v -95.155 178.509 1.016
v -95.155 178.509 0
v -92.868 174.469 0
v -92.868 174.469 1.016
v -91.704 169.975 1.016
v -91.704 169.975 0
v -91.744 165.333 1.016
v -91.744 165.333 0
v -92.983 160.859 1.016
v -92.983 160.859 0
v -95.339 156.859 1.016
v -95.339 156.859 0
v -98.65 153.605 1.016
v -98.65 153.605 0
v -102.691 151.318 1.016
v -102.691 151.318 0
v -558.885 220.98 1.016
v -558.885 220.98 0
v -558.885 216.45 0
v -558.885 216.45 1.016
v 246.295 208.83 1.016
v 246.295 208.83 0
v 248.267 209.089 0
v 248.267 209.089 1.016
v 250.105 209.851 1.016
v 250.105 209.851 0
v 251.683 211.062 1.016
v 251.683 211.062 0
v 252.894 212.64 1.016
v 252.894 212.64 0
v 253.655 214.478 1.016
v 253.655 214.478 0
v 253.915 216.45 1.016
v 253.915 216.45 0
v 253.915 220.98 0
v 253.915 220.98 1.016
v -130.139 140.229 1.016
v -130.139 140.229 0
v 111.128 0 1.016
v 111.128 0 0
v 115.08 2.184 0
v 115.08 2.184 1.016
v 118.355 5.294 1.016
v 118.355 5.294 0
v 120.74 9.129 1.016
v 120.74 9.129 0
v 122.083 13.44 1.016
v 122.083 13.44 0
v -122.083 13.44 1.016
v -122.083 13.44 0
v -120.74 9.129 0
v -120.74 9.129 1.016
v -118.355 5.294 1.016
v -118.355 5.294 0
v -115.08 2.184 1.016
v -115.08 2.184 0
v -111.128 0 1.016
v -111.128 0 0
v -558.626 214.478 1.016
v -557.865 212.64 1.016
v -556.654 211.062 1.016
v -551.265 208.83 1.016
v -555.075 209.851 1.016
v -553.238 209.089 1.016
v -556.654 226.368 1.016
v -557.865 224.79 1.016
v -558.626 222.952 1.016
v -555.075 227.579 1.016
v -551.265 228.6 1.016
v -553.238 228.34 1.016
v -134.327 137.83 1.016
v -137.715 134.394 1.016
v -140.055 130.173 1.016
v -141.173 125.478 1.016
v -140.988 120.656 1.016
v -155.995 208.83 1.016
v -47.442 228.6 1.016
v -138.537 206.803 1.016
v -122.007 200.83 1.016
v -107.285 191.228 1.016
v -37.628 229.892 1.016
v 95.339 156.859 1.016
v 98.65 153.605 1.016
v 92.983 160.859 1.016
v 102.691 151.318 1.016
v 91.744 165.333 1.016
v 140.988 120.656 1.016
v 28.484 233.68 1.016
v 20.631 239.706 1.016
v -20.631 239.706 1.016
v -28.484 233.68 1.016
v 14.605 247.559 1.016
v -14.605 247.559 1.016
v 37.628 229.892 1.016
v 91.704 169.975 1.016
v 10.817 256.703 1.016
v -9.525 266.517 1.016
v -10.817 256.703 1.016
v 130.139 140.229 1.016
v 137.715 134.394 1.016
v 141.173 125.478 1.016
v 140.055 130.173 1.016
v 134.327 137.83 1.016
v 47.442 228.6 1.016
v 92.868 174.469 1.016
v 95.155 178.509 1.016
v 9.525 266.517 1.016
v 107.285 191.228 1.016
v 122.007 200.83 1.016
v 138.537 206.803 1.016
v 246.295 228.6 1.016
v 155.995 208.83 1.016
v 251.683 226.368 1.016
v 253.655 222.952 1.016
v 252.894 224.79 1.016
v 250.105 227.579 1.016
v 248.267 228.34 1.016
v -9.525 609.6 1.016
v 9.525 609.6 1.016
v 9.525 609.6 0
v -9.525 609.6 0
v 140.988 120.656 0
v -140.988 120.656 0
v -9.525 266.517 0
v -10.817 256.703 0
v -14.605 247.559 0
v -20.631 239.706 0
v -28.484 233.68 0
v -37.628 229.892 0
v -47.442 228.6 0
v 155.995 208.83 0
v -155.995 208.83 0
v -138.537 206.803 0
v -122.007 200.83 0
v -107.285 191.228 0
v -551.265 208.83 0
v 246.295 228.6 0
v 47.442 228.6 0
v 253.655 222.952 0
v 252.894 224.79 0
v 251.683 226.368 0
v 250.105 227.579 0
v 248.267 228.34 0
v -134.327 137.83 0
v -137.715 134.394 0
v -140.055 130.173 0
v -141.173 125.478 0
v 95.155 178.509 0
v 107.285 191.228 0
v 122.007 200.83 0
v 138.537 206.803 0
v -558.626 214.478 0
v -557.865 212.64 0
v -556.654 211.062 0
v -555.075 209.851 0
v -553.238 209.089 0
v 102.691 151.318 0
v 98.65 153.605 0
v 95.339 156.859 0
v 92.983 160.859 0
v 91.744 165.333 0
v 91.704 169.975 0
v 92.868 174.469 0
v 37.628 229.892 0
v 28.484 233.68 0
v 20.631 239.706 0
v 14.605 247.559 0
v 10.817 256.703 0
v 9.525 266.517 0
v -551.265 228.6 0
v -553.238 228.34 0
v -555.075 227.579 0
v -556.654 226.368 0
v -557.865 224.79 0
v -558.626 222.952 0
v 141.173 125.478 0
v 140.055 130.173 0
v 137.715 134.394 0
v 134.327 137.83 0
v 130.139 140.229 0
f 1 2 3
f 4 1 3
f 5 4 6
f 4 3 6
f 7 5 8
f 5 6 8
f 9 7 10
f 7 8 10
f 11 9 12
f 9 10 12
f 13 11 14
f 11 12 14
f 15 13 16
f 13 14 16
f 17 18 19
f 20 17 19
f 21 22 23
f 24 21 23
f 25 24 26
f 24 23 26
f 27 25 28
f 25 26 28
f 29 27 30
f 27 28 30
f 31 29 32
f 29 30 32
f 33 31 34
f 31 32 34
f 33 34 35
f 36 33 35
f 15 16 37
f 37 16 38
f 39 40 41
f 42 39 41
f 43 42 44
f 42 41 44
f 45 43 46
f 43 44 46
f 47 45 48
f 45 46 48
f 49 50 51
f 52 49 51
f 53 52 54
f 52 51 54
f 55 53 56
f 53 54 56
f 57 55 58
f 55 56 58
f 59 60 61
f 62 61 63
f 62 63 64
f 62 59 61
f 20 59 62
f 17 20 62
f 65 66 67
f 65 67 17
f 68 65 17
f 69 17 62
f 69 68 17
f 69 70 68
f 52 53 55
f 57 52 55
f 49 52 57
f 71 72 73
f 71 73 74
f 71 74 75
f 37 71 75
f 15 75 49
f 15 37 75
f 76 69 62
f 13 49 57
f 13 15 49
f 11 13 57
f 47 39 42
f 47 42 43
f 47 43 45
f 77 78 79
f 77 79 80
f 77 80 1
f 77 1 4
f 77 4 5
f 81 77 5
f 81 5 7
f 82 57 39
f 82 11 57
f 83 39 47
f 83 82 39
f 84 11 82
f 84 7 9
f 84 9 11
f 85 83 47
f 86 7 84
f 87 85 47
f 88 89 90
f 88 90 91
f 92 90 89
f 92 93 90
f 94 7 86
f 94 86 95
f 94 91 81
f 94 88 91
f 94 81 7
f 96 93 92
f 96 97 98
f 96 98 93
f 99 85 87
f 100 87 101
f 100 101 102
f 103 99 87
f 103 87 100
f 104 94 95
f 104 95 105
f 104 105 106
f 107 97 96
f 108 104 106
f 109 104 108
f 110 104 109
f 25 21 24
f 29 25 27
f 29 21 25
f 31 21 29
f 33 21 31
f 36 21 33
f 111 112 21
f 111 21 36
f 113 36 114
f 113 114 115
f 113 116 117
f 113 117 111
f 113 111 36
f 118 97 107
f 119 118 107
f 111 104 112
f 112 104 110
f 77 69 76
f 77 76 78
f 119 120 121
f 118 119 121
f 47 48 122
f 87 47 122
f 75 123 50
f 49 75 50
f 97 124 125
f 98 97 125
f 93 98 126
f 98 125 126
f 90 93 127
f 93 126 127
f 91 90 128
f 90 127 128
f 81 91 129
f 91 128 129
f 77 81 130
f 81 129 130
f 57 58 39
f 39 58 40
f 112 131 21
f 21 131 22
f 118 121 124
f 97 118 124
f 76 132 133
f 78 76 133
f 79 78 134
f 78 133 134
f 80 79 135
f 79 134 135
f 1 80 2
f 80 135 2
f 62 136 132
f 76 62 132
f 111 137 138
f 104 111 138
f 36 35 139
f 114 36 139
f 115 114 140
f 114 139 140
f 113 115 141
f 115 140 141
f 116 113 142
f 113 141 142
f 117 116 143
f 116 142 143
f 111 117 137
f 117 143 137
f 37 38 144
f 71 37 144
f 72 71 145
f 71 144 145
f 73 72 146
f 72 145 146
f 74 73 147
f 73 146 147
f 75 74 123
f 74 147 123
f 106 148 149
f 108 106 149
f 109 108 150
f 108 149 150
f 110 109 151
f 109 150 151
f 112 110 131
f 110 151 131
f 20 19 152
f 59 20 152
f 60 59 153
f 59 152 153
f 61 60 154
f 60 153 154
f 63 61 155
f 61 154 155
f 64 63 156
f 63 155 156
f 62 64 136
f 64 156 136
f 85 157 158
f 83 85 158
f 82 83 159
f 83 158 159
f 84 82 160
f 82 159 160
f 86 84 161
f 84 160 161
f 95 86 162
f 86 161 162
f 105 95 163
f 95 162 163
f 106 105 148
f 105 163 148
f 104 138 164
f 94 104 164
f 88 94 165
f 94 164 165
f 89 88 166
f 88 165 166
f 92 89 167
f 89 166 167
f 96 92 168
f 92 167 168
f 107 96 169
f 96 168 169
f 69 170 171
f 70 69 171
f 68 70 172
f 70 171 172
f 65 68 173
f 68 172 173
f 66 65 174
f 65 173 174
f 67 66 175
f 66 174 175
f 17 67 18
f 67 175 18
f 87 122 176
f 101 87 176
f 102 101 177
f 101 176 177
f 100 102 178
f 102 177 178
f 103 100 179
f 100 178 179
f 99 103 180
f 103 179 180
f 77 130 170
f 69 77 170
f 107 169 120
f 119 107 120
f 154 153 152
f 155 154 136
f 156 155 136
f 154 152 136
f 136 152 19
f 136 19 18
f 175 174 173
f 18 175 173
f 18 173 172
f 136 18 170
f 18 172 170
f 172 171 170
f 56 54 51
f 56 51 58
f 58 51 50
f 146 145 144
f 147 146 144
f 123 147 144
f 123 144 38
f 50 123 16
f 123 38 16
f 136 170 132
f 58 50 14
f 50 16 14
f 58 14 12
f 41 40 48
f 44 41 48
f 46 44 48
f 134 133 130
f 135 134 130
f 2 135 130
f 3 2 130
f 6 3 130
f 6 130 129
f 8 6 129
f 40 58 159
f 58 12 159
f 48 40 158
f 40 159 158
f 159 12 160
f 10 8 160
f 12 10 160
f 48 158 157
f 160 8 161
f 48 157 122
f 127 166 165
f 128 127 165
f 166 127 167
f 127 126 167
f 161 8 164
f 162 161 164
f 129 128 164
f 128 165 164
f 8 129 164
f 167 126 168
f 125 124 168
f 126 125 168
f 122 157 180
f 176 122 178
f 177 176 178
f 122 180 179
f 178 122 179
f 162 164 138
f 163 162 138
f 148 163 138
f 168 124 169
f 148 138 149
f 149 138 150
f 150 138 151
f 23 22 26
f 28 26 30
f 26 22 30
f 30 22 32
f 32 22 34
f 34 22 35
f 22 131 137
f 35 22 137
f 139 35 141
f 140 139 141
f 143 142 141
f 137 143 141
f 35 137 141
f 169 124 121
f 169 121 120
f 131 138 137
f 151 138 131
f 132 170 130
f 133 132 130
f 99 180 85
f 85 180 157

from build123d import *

# Parameters (mm, degrees)
BOSS_EXTRUDE1_DEPTH = 1.016


with BuildPart() as part:
    # Sketch1 → Boss-Extrude1 (new body)
    with BuildSketch(Plane.XY):
        with BuildLine():
            Line((-102.690520384, 151.318398839), (-130.138661403, 140.228630017))
            ThreePointArc((-130.138661403, 140.228630017), (-139.028894565, 132.36321613), (-140.988038021, 120.655836484))
            Line((-140.988038021, 120.655836484), (-122.083041186, 13.440271634))
            ThreePointArc((-122.083041186, 13.440271634), (-118.354836941, 5.294136523), (-111.127725304, 0))
            Line((-111.127725304, 0), (111.127725304, 0))
            ThreePointArc((111.127725304, 0), (118.354836941, 5.294136523), (122.083041186, 13.440271634))
            Line((122.083041186, 13.440271634), (140.988038021, 120.655836484))
            ThreePointArc((140.988038021, 120.655836484), (139.028894565, 132.36321613), (130.138661403, 140.228630017))
            Line((130.138661403, 140.228630017), (102.690520384, 151.318398839))
            ThreePointArc((102.690520384, 151.318398839), (92.216863272, 163.055161588), (95.154949405, 178.50885833))
            ThreePointArc((95.154949405, 178.50885833), (122.006673364, 200.829543277), (155.995276019, 208.829727371))
            Line((155.995276019, 208.829727371), (246.294572316, 208.829727371))
            ThreePointArc((246.294572316, 208.829727371), (251.682725989, 211.061573699), (253.914572316, 216.449727371))
            Line((253.914572316, 216.449727371), (253.914572316, 220.98))
            ThreePointArc((253.914572316, 220.98), (251.682725989, 226.368153673), (246.294572316, 228.6))
            Line((246.294572316, 228.6), (47.442005026, 228.6))
            ThreePointArc((47.442005026, 228.6), (20.63063365, 239.70563365), (9.525, 266.517005026))
            Line((9.525, 266.517005026), (9.525, 609.6))
            Line((9.525, 609.6), (-9.525, 609.6))
            Line((-9.525, 609.6), (-9.525, 266.517005026))
            ThreePointArc((-9.525, 266.517005026), (-20.63063365, 239.70563365), (-47.442005026, 228.6))
            Line((-47.442005026, 228.6), (-551.265427684, 228.6))
            ThreePointArc((-551.265427684, 228.6), (-556.653581357, 226.368153673), (-558.885427684, 220.98))
            Line((-558.885427684, 220.98), (-558.885427684, 216.449727371))
            ThreePointArc((-558.885427684, 216.449727371), (-556.653581357, 211.061573699), (-551.265427684, 208.829727371))
            Line((-551.265427684, 208.829727371), (-155.995276019, 208.829727371))
            ThreePointArc((-155.995276019, 208.829727371), (-122.006673364, 200.829543277), (-95.154949405, 178.50885833))
            ThreePointArc((-95.154949405, 178.50885833), (-92.216863272, 163.055161588), (-102.690520384, 151.318398839))
        make_face()
    extrude(amount=BOSS_EXTRUDE1_DEPTH)


solid = part.part
